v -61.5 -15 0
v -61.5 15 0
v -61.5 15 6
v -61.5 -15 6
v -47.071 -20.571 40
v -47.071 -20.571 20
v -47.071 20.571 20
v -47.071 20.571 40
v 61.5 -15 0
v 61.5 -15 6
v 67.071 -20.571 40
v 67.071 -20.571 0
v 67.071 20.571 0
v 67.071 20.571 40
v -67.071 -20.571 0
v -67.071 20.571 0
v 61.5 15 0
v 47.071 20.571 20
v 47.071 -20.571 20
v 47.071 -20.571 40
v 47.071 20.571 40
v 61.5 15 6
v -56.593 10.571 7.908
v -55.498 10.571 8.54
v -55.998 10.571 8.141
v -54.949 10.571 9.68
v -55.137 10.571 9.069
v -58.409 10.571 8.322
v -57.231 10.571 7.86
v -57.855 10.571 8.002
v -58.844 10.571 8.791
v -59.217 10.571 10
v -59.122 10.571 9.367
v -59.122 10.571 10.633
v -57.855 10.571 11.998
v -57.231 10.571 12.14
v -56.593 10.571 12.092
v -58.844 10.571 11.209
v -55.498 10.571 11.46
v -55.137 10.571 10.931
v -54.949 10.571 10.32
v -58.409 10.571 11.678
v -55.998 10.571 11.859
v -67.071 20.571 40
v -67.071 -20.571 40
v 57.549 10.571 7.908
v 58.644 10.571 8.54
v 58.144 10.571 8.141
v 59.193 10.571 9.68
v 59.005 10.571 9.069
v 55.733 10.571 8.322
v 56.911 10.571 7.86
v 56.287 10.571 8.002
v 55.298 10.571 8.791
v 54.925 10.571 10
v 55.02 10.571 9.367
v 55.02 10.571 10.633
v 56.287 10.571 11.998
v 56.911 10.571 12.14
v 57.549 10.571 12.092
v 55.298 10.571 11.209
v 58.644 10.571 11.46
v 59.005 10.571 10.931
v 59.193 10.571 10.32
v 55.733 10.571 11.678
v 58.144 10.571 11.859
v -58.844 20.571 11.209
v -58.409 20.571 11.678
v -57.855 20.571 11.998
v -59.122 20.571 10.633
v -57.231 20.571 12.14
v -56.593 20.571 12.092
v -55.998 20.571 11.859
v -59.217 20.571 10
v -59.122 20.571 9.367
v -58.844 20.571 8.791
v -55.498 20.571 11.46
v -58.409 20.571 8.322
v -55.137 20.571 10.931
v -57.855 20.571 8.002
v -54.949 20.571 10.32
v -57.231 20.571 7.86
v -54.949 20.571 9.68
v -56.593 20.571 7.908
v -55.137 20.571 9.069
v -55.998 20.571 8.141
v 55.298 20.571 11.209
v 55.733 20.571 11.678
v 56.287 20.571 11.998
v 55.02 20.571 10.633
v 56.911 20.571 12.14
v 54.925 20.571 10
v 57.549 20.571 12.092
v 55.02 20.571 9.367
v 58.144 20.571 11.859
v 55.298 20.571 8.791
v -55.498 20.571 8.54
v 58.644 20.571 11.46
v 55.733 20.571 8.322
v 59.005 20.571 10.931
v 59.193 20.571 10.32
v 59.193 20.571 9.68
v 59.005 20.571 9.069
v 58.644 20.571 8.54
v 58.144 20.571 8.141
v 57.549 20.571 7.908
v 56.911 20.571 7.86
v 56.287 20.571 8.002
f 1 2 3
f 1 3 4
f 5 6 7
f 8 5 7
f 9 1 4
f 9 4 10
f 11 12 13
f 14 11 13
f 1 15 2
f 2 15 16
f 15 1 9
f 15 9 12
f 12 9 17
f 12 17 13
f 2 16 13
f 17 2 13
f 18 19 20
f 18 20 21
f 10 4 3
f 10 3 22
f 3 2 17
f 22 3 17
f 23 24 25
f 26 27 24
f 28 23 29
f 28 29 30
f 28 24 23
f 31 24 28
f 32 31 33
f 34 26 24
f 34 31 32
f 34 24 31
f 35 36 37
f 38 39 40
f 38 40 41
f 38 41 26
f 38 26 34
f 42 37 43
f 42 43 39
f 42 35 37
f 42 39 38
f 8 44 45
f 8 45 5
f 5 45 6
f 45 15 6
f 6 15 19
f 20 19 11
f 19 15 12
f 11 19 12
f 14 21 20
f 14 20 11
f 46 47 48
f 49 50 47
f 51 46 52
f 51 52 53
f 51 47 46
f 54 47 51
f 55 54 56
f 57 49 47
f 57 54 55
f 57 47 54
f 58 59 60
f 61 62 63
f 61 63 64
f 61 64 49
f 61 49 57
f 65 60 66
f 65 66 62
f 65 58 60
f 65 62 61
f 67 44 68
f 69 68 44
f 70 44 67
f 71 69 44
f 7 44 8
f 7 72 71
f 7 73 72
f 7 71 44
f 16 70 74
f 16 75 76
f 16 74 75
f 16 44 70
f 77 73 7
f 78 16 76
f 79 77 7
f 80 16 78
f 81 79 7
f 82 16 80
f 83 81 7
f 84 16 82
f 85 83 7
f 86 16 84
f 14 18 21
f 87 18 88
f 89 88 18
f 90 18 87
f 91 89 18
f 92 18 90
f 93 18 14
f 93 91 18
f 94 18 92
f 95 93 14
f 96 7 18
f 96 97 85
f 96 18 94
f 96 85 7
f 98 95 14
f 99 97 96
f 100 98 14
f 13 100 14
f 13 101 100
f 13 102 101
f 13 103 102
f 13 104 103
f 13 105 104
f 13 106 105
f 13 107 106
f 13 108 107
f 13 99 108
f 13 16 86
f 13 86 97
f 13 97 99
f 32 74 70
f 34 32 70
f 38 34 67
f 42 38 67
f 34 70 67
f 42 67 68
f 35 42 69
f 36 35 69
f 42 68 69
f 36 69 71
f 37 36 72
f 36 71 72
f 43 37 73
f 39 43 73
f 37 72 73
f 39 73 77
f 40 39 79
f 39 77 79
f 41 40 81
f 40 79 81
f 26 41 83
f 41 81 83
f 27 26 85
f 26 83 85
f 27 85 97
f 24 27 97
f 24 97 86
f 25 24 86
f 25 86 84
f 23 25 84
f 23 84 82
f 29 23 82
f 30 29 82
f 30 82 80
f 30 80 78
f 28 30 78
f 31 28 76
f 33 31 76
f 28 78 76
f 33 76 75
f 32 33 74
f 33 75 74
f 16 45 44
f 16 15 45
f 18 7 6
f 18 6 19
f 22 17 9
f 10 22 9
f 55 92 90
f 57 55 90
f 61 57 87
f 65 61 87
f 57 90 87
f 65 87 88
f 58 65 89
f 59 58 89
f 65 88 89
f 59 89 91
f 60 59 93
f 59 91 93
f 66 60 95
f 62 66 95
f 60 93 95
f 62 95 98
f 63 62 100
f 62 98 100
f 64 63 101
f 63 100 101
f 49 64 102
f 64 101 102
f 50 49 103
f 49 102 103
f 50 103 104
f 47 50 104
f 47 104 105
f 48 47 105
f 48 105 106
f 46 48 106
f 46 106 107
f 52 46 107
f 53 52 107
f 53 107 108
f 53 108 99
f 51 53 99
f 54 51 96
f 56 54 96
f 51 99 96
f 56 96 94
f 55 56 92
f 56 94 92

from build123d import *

# Parameters (mm, degrees)
SKETCH_W        = 134.142136
SKETCH_H        = 41.142136
PAD_DEPTH       = 20
SKETCH001_W     = 20
SKETCH001_H     = 41.142136
PAD001_DEPTH    = 20
SKETCH002_W     = 123
SKETCH002_H     = 30
POCKET_DEPTH    = 6
SKETCH003_R     = 2.1463
POCKET001_DEPTH = 10


with BuildPart() as part:
    # Sketch → Pad (new body)
    with BuildSketch(Plane.XY):
        Rectangle(SKETCH_W, SKETCH_H)
    extrude(amount=PAD_DEPTH)

    # Sketch001 (on Face6 of Pad) → Pad001 (join)
    with BuildSketch(Plane.XY.offset(20)):
        with Locations((-57.071068, 0)):
            Rectangle(SKETCH001_W, SKETCH001_H)
        with Locations((57.071068, 0)):
            Rectangle(SKETCH001_W, SKETCH001_H)
    extrude(amount=PAD001_DEPTH)

    # Sketch002 (on Face4 of Pad001) → Pocket (cut)
    with BuildSketch(Plane(origin=(0, 0, 0), x_dir=(1, 0, 0), z_dir=(0, 0, -1))):
        Rectangle(SKETCH002_W, SKETCH002_H)
    extrude(amount=-POCKET_DEPTH, mode=Mode.SUBTRACT)

    # Sketch003 (on Face1 of Pocket) → Pocket001 (cut)
    with BuildSketch(Plane(origin=(0, 20.571068, 0), x_dir=(-1, 0, 0), z_dir=(0, 1, 0))):
        with Locations((-57.071068, 10)):
            Circle(SKETCH003_R)
        with Locations((57.071068, 10)):
            Circle(SKETCH003_R)
    extrude(amount=-POCKET001_DEPTH, mode=Mode.SUBTRACT)


solid = part.part
